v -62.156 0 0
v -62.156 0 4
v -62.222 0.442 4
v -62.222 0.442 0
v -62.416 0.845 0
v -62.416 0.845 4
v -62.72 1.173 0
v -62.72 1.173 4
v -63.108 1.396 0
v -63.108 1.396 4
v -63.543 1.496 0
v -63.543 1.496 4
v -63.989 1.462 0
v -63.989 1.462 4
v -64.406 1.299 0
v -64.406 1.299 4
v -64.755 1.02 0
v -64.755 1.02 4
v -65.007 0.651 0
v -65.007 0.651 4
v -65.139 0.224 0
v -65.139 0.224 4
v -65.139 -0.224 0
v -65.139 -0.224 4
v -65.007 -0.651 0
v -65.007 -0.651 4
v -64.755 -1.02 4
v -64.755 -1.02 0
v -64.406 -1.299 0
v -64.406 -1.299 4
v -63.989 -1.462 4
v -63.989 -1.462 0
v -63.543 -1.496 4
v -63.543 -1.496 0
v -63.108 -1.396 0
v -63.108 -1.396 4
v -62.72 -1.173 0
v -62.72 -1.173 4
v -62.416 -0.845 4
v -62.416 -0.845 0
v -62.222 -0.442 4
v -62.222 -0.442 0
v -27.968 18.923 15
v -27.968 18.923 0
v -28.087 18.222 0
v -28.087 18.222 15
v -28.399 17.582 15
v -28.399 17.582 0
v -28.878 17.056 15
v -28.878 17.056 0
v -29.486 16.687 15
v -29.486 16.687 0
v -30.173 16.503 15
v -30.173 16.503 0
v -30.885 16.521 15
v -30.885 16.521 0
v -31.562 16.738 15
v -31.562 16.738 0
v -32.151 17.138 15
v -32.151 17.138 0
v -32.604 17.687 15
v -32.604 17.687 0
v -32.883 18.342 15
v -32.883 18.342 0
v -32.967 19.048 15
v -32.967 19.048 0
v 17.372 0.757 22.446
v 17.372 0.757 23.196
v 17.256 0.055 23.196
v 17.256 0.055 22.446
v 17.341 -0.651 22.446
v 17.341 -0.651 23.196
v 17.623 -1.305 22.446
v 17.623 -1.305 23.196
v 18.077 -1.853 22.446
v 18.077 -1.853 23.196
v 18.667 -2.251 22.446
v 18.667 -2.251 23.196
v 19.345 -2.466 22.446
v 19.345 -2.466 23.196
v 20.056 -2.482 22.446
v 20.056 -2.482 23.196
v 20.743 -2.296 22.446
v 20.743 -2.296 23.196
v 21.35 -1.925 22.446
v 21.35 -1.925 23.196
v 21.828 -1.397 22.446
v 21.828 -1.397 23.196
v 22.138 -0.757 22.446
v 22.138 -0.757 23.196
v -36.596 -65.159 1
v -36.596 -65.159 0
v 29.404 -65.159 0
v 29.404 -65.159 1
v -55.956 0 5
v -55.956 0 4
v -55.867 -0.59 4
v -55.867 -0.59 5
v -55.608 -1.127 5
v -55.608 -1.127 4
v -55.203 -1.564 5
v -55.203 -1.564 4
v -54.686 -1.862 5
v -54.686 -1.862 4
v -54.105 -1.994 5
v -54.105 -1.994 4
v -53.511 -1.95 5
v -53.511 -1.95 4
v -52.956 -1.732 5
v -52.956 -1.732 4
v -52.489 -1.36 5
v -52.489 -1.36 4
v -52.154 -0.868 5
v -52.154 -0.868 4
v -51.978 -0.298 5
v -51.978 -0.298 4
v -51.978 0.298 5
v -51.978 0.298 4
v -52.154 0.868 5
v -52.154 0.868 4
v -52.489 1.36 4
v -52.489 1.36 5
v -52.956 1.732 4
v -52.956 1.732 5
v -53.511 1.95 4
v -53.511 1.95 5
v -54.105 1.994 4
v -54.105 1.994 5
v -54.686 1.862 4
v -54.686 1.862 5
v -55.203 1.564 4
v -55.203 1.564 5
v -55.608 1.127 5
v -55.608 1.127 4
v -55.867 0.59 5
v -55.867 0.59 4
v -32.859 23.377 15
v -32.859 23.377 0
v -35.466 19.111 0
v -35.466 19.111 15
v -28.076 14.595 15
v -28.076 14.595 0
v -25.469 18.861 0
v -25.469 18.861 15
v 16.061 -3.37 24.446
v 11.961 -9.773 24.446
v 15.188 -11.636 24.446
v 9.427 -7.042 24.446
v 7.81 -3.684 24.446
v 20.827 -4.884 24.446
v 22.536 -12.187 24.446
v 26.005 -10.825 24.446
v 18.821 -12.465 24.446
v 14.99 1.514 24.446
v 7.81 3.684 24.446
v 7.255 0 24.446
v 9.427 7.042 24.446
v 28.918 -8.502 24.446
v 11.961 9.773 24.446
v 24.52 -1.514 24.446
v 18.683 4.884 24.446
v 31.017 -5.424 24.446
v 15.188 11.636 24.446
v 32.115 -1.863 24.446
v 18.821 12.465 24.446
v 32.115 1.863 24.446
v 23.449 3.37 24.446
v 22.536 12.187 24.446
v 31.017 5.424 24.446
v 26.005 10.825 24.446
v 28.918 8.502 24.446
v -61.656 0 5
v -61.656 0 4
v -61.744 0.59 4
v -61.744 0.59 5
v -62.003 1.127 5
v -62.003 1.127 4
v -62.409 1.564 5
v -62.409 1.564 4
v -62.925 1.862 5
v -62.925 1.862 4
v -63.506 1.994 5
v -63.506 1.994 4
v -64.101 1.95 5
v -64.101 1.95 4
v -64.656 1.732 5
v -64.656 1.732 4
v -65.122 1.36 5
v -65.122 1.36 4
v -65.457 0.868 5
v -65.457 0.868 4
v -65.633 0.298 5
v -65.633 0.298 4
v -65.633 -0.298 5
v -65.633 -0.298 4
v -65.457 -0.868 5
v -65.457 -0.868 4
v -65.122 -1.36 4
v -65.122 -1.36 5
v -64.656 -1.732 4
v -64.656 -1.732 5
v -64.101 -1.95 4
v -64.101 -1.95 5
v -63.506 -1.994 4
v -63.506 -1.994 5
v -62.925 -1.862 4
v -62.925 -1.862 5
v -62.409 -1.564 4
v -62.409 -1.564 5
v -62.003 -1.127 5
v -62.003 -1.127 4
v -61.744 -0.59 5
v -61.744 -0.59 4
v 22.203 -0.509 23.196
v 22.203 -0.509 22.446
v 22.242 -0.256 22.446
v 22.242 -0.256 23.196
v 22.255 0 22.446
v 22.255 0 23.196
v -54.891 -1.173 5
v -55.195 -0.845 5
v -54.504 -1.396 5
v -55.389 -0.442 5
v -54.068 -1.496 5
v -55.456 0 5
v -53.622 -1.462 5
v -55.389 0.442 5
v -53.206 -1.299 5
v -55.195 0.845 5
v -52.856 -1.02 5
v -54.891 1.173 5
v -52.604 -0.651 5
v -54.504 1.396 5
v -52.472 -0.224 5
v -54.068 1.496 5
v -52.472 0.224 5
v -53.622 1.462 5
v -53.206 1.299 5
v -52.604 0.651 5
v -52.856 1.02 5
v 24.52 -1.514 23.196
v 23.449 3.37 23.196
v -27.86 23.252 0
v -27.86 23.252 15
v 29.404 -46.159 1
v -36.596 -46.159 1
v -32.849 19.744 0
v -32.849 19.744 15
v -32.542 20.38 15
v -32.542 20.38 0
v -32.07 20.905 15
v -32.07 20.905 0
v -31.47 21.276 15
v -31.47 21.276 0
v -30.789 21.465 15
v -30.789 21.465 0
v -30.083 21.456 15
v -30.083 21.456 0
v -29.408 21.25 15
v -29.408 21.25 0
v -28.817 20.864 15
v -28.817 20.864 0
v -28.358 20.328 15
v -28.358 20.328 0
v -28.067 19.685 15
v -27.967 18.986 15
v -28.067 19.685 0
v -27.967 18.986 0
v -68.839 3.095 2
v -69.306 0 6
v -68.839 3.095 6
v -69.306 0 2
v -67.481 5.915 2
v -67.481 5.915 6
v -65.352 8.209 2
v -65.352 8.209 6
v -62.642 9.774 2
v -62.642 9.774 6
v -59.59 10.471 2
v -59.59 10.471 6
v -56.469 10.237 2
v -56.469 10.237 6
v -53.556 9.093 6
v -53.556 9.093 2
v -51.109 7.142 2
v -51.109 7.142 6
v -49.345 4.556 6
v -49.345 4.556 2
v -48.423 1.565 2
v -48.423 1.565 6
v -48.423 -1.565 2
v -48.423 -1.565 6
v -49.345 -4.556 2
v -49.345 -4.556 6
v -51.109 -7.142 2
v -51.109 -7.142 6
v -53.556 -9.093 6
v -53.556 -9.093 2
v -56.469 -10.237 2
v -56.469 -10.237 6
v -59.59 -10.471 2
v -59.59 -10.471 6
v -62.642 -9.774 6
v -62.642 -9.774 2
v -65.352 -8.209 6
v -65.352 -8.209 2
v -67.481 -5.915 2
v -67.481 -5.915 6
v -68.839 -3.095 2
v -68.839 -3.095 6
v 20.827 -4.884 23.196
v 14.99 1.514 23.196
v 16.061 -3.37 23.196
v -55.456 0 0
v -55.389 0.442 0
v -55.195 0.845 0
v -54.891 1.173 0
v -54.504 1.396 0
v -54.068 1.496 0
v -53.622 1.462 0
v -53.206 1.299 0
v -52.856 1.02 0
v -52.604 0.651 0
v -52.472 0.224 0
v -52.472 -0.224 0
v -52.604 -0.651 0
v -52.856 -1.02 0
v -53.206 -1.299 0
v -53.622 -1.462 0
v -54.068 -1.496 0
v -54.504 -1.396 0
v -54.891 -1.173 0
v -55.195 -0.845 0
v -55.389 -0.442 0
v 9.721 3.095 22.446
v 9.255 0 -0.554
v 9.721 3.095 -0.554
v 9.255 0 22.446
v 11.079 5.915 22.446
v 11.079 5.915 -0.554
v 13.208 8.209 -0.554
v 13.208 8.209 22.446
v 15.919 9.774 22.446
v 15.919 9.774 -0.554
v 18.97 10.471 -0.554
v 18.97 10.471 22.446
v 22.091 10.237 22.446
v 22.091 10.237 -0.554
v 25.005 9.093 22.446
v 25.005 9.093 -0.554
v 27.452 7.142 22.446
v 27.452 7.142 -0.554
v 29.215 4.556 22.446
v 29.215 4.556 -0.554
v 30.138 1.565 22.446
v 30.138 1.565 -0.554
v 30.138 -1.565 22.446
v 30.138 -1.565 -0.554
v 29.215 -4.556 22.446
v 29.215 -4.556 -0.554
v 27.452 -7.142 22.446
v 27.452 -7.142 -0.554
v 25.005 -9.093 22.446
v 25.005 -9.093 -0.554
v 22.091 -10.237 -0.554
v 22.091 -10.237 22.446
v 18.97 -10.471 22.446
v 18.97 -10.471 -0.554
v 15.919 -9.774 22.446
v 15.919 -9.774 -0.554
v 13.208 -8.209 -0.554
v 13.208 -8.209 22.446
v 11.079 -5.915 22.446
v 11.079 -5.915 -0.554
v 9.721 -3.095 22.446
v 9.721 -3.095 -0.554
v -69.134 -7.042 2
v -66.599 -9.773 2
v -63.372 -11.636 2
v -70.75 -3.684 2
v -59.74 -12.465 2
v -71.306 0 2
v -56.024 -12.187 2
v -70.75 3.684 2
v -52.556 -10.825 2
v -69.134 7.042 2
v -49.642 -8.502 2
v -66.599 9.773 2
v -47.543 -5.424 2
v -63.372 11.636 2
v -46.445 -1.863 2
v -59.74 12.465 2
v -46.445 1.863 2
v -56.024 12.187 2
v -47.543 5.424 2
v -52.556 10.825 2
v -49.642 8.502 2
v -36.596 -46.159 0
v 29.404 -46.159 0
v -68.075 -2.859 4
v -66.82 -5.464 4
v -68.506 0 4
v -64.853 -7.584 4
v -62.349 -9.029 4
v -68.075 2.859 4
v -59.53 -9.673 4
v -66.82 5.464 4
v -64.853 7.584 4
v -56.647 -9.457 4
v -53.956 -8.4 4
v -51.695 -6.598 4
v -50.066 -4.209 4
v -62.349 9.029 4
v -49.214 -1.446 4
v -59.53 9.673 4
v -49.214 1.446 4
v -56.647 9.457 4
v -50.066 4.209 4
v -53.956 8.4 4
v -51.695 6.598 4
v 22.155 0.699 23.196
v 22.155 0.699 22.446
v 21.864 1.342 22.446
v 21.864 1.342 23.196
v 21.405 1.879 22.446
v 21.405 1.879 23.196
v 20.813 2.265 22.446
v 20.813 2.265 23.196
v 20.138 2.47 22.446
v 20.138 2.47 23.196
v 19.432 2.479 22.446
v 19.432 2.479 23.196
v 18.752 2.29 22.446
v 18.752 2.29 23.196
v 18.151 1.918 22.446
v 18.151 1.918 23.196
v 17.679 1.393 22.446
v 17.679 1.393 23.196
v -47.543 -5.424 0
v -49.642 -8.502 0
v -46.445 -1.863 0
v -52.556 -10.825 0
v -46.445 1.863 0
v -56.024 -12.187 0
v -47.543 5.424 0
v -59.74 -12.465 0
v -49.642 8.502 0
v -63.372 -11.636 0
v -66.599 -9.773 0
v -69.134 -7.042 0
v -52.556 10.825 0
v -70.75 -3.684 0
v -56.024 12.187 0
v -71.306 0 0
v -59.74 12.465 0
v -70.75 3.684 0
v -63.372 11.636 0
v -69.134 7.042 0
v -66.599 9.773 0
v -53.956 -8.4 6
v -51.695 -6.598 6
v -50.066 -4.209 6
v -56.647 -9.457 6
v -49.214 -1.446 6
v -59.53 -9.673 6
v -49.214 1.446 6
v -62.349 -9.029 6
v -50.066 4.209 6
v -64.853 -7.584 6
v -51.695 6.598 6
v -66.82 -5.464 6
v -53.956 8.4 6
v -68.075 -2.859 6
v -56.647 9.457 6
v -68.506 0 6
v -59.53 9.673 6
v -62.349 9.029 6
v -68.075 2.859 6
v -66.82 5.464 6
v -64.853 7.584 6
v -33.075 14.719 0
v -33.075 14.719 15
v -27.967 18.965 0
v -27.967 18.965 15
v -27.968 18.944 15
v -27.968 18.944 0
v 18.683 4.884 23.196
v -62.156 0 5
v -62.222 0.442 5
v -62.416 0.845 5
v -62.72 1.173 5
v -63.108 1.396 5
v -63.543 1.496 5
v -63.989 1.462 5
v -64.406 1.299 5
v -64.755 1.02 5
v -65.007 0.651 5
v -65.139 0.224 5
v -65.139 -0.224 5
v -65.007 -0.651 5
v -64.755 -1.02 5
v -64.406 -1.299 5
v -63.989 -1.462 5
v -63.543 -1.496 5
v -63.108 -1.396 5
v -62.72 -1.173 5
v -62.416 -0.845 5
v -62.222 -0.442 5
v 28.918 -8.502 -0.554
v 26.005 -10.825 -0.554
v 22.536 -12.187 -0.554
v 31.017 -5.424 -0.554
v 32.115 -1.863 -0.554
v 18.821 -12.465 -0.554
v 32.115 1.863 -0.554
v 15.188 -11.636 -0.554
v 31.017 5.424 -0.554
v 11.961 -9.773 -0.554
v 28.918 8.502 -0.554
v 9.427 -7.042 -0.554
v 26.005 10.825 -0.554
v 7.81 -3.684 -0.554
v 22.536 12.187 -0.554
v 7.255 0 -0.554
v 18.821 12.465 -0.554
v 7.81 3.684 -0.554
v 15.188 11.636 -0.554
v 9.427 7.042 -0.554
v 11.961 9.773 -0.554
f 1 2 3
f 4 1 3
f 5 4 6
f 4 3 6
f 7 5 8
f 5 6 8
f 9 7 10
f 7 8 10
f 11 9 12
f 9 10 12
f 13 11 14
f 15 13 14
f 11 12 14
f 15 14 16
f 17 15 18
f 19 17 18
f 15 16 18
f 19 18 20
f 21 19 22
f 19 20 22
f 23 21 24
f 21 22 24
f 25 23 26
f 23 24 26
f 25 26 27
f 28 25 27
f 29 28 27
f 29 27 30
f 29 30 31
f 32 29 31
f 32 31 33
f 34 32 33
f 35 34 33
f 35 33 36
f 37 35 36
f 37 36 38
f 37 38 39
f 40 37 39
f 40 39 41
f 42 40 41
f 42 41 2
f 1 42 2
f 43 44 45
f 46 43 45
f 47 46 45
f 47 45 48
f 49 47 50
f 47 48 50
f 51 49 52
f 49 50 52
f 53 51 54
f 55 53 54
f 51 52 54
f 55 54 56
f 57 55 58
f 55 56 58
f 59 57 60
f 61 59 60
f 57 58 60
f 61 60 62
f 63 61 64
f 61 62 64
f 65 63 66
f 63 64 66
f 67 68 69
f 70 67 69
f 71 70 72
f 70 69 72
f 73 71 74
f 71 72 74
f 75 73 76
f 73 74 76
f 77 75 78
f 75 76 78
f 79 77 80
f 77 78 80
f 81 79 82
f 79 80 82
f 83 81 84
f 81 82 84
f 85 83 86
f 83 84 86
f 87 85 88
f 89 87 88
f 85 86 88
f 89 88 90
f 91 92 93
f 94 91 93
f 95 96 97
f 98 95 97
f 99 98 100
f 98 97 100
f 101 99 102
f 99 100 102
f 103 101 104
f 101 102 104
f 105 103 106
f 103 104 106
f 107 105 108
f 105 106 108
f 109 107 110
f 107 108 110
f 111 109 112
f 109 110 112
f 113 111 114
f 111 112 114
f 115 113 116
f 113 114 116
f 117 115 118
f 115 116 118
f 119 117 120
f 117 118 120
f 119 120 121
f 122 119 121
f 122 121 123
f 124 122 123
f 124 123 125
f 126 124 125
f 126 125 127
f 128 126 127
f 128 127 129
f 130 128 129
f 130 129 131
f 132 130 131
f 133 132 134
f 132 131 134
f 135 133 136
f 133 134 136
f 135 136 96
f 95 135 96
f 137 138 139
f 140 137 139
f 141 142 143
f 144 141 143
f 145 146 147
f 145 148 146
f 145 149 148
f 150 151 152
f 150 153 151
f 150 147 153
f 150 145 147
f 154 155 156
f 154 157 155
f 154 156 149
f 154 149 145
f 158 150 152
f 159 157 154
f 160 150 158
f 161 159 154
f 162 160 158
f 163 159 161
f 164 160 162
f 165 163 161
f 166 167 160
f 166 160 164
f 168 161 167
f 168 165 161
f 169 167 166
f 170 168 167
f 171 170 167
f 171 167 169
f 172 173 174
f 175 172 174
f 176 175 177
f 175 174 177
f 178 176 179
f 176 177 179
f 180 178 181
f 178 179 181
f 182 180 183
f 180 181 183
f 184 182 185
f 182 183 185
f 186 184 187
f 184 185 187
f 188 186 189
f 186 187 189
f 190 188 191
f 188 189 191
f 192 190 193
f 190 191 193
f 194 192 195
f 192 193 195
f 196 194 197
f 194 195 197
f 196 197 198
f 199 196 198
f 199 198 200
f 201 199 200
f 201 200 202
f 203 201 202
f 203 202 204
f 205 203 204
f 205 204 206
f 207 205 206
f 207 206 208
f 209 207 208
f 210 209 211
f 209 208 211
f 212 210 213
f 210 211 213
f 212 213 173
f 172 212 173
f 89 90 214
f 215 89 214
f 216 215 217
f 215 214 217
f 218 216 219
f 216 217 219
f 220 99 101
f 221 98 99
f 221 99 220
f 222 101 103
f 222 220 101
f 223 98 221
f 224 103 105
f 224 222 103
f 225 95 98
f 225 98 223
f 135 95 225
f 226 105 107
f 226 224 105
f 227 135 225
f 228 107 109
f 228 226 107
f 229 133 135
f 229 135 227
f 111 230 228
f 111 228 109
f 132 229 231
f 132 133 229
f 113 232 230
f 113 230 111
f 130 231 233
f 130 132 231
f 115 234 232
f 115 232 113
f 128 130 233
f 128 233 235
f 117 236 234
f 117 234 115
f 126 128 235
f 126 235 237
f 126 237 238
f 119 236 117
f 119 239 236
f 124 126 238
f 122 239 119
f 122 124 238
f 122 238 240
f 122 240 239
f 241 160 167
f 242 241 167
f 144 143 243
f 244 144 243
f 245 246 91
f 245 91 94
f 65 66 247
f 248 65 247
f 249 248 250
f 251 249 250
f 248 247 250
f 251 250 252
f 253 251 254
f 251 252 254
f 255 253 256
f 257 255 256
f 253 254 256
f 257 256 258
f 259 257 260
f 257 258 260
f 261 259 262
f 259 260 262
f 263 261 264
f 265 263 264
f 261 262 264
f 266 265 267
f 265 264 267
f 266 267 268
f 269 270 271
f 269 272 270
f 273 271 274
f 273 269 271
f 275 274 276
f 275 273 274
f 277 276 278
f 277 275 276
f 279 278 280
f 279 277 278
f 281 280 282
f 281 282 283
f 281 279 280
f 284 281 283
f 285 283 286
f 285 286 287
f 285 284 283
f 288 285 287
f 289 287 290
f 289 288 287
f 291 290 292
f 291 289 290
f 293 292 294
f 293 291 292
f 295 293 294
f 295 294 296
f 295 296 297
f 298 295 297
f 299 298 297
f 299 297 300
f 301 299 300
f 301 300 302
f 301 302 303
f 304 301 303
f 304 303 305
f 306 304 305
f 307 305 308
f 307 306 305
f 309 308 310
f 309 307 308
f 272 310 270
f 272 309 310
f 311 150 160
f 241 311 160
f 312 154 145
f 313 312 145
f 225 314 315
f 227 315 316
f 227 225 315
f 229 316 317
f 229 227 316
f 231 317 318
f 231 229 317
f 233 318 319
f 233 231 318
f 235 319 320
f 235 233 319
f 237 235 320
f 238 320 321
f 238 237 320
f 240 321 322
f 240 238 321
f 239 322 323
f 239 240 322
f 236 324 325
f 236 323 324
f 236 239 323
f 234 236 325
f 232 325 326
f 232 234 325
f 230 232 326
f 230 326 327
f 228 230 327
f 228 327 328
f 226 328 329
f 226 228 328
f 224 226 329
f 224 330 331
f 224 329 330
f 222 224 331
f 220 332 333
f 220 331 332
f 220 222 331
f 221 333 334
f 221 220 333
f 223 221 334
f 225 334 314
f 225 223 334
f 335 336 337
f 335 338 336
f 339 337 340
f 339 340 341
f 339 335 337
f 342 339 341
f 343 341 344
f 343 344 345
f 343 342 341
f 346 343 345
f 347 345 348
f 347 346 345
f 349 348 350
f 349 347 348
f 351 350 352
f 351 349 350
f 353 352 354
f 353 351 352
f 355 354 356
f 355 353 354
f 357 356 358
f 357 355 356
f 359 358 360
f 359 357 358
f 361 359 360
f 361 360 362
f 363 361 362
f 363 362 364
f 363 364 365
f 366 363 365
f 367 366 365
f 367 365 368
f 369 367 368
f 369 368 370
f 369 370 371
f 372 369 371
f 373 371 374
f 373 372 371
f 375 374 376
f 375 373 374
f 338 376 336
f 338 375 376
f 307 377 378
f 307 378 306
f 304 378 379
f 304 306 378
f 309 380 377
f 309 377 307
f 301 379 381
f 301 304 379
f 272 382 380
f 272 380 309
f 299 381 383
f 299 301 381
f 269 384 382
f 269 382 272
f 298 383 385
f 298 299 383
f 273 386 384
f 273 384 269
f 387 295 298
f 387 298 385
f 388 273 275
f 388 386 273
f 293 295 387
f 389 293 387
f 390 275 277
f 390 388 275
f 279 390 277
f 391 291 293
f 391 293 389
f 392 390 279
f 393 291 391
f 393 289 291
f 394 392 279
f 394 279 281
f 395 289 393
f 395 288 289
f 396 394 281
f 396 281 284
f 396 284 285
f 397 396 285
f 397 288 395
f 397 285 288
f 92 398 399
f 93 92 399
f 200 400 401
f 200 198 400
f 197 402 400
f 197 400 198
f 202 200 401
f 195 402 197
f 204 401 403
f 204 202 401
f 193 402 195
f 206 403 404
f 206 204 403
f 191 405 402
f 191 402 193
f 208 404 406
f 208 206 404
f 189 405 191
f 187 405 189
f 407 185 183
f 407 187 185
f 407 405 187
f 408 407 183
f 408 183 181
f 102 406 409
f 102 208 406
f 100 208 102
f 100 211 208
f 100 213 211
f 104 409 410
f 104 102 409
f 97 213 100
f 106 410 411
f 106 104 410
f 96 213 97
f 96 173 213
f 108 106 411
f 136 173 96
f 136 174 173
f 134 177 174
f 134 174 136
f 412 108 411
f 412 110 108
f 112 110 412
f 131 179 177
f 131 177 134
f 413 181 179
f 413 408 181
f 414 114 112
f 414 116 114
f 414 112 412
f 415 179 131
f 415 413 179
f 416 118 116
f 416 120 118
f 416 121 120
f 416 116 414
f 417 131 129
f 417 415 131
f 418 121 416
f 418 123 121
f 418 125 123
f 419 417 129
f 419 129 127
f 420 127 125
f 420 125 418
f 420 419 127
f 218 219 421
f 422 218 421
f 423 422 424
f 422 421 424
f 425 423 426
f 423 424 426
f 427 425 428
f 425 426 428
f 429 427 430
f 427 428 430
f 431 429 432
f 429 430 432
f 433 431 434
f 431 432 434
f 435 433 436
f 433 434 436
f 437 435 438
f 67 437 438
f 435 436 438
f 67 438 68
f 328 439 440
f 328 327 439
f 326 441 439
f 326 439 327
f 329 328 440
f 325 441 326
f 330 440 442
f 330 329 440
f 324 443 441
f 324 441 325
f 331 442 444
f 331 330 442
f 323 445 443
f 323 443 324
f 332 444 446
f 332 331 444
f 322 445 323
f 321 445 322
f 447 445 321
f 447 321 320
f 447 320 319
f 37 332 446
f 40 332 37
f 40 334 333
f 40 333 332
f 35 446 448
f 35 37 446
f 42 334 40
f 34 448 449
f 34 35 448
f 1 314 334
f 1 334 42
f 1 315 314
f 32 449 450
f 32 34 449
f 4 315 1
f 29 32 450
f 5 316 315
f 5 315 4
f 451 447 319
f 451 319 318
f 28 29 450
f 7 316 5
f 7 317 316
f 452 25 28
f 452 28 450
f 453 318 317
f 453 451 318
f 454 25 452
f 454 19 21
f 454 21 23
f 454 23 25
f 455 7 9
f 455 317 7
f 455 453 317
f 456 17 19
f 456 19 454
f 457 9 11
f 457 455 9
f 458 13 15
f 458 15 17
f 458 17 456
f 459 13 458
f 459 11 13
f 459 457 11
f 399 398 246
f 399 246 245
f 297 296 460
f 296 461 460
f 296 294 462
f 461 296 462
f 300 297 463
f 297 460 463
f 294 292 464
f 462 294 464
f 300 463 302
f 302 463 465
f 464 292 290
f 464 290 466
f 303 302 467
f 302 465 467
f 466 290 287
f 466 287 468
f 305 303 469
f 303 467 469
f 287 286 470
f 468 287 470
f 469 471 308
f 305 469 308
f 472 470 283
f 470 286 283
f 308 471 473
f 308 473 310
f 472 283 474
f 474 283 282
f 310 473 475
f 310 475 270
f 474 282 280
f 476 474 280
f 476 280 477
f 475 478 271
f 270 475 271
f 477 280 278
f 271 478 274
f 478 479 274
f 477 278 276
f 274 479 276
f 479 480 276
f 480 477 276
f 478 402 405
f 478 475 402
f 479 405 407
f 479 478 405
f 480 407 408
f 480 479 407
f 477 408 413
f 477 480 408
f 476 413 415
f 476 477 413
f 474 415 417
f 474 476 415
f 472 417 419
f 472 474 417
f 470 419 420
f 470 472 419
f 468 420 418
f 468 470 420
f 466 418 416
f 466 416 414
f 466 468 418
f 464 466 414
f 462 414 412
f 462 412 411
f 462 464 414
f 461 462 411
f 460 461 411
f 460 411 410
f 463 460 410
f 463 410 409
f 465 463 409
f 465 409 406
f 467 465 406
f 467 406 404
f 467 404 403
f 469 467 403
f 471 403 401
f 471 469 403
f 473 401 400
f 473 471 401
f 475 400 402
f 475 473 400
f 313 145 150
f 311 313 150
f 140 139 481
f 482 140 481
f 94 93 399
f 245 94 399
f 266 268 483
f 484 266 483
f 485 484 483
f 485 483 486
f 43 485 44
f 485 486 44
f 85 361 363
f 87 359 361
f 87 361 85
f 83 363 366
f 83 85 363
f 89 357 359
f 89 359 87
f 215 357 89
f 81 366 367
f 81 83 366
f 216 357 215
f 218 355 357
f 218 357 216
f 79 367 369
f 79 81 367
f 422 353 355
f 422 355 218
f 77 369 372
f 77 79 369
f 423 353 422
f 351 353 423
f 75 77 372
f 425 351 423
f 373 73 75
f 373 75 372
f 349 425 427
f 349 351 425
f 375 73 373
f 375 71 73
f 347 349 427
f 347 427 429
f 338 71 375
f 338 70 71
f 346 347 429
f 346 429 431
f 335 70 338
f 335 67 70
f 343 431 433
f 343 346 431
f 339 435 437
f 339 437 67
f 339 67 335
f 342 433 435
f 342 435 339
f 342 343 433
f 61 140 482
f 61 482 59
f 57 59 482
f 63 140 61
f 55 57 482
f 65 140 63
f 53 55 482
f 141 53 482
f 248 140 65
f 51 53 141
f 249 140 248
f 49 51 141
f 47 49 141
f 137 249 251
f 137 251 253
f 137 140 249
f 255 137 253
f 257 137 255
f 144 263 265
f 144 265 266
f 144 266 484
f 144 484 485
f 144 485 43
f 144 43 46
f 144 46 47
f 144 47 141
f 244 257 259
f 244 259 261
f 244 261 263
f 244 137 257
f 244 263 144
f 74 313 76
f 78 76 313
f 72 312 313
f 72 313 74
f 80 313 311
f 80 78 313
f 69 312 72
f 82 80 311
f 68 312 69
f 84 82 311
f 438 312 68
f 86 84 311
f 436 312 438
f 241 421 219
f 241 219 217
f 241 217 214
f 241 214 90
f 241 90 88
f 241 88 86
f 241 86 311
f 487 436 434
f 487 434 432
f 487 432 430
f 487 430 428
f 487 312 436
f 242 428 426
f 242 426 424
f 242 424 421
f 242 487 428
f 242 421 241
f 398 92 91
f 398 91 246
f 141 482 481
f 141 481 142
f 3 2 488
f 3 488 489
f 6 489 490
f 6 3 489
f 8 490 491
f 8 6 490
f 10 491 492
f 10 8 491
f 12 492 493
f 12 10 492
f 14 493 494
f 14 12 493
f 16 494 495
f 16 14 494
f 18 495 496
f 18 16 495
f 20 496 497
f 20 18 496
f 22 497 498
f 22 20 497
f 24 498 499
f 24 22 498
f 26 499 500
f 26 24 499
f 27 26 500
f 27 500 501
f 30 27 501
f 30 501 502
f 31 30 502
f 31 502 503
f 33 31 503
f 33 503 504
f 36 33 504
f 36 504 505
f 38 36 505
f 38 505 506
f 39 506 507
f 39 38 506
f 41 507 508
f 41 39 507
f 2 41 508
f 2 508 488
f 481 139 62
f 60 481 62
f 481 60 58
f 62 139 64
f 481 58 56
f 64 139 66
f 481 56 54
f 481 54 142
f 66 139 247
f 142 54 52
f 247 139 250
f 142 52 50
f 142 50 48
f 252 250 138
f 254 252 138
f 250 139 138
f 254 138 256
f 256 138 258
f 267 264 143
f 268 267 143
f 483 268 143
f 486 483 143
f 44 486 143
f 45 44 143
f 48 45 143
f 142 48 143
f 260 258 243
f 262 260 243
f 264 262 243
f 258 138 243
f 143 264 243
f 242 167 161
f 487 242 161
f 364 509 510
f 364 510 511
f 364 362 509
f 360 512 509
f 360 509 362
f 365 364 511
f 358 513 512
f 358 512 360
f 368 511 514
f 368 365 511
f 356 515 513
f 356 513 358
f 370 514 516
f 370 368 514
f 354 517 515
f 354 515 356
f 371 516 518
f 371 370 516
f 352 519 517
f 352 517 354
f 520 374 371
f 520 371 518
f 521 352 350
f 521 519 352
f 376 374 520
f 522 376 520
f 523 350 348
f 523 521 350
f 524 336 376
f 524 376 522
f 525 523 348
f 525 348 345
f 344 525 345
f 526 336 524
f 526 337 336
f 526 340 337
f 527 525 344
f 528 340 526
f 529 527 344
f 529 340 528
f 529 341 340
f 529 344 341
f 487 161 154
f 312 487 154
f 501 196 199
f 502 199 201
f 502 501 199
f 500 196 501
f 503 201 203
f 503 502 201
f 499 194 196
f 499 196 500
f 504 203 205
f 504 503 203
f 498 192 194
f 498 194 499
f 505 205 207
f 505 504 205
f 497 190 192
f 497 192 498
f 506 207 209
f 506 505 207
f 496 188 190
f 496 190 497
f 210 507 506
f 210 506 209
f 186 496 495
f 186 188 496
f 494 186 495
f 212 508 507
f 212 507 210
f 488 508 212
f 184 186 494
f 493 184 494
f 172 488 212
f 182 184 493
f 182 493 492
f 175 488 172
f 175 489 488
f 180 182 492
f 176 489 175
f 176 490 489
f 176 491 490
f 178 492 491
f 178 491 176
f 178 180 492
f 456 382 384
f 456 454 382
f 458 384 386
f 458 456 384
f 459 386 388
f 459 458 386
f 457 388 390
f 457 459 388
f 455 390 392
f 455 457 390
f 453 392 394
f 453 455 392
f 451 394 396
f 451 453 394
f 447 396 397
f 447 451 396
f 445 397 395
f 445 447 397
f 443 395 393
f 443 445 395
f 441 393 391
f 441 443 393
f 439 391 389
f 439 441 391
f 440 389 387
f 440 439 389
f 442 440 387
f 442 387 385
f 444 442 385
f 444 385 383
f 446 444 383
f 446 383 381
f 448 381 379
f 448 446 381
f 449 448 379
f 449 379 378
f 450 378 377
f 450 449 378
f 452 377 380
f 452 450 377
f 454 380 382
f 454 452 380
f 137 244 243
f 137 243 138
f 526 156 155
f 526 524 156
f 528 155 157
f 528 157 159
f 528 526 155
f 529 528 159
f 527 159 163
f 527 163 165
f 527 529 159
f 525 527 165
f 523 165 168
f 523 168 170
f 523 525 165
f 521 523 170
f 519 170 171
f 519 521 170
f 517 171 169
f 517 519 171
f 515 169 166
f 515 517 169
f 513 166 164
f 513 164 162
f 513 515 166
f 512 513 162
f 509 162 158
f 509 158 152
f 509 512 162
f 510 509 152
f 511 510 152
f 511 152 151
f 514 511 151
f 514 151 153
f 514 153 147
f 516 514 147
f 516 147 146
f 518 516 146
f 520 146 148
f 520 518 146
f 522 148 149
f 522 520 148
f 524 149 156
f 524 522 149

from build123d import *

# Parameters (mm, degrees)
F1_DEPTH  = 15
F5_DEPTH  = 25
F6_DEPTH  = 1.25
F7_W      = 0.8
F7_H      = 2
F9_R      = 2
F9_R_2    = 1.5
F10_DEPTH = 1
F11_DEPTH = 25
F12_W     = 66
F12_H     = 19
F13_DEPTH = 1


with BuildPart() as f1:
    # F0 (on Top) → F1 (new body)
    with BuildSketch(Plane.XY):
        with BuildLine():
            Line((-27.9680936464, 18.9234757941), (-25.4688717607, 18.8611062027))
            Line((-25.4688717607, 18.8611062027), (-27.8600663452, 23.2522550796))
            Line((-27.8600663452, 23.2522550796), (-32.8585101166, 23.3769942625))
            Line((-32.8585101166, 23.3769942625), (-35.4657593036, 19.1105845686))
            Line((-35.4657593036, 19.1105845686), (-32.9665374179, 19.0482149771))
            ThreePointArc((-32.9665374179, 19.0482149771), (-30.4361283096, 21.4856508495), (-27.9673155322, 18.9858453856))
            ThreePointArc((-27.9673155322, 18.9858453856), (-27.9675100683, 18.9546581631), (-27.9680936464, 18.9234757941))
        make_face()
        with BuildLine():
            Line((-28.0761209477, 14.5946965087), (-25.4688717607, 18.8611062027))
            Line((-25.4688717607, 18.8611062027), (-27.9680936464, 18.9234757941))
            ThreePointArc((-27.9680936464, 18.9234757941), (-30.5296851236, 16.4866234999), (-32.9665374179, 19.0482149771))
            Line((-32.9665374179, 19.0482149771), (-35.4657593036, 19.1105845686))
            Line((-35.4657593036, 19.1105845686), (-33.0745647191, 14.7194356916))
            Line((-33.0745647191, 14.7194356916), (-28.0761209477, 14.5946965087))
        make_face()
    extrude(amount=F1_DEPTH)


with BuildPart() as f3:
    # F2 (on Front) → F3 (revolve)
    with BuildSketch(Plane.XZ):
        Polygon((7.2549805045, 24.4458311237), (7.2549805045, -0.5541688763), (9.2549805045, -0.5541688763), (9.2549805045, 22.4458311237), (19.7549805045, 22.4458311237), (19.7549805045, 24.4458311237), align=None)
    revolve(axis=Axis((19.7549805045, 0, 23.4458311237), (0, 0, -1)))

    # F4 (on face) → F5 (cut)
    with BuildSketch(Plane.XY.offset(24.4458311237)):
        with BuildLine():
            Line((22.1376669218, -0.7568391089), (17.3722940872, 0.7568391089))
            ThreePointArc((17.3722940872, 0.7568391089), (18.9981413957, -2.3826864173), (22.1376669218, -0.7568391089))
        make_face()
        with BuildLine():
            ThreePointArc((22.2549805045, 0), (20.1379191136, 2.4704975251), (17.3722940872, 0.7568391089))
            Line((17.3722940872, 0.7568391089), (22.1376669218, -0.7568391089))
            ThreePointArc((22.1376669218, -0.7568391089), (22.2254780296, -0.3829386091), (22.2549805045, 0))
        make_face()
    extrude(amount=-F5_DEPTH, mode=Mode.SUBTRACT)

    # F4 (on face) → F6 (cut)
    with BuildSketch(Plane.XY.offset(24.4458311237)):
        with BuildLine():
            Line((23.4485507115, 3.3700948244), (18.6831778769, 4.8837730422))
            Line((18.6831778769, 4.8837730422), (14.9896076699, 1.5136782177))
            Line((14.9896076699, 1.5136782177), (17.3722940872, 0.7568391089))
            ThreePointArc((17.3722940872, 0.7568391089), (20.1379191136, 2.4704975251), (22.2549805045, 0))
            ThreePointArc((22.2549805045, 0), (22.2254780296, -0.3829386091), (22.1376669218, -0.7568391089))
            Line((22.1376669218, -0.7568391089), (24.5203533392, -1.5136782177))
            Line((24.5203533392, -1.5136782177), (23.4485507115, 3.3700948244))
        make_face()
        with BuildLine():
            Line((17.3722940872, 0.7568391089), (14.9896076699, 1.5136782177))
            Line((14.9896076699, 1.5136782177), (16.0614102975, -3.3700948244))
            Line((16.0614102975, -3.3700948244), (20.8267831321, -4.8837730422))
            Line((20.8267831321, -4.8837730422), (24.5203533392, -1.5136782177))
            Line((24.5203533392, -1.5136782177), (22.1376669218, -0.7568391089))
            ThreePointArc((22.1376669218, -0.7568391089), (18.9981413957, -2.3826864173), (17.3722940872, 0.7568391089))
        make_face()
    extrude(amount=-F6_DEPTH, mode=Mode.SUBTRACT)


with BuildPart() as f8:
    # F7 (on Front) → F8 (revolve)
    with BuildSketch(Plane.XZ):
        Polygon((-71.3055579922, 2), (-71.3055579922, 0), (-58.8055579922, 0), (-58.8055579922, 4), (-68.5055579922, 4), (-69.3055579922, 4), (-69.3055579922, 2), align=None)
        with Locations((-68.9055579922, 5)):
            Rectangle(F7_W, F7_H)
    revolve(axis=Axis((-58.8055579922, 0, 2), (0, 0, -1)))

    # F9 (on face) → F10 (join)
    with BuildSketch(Plane.XY.offset(4)):
        with Locations((-63.6555579922, 0)):
            Circle(F9_R)
        with Locations((-63.6555579922, 0)):
            Circle(F9_R_2, mode=Mode.SUBTRACT)
        with BuildLine():
            ThreePointArc((-51.9555579922, 0), (-53.9555579922, 2), (-55.9555579922, 0))
            ThreePointArc((-55.9555579922, 0), (-53.9555579922, -2), (-51.9555579922, 0))
        make_face()
        with BuildLine():
            ThreePointArc((-52.4555579922, 0), (-53.9555579922, -1.5), (-55.4555579922, 0))
            ThreePointArc((-55.4555579922, 0), (-53.9555579922, 1.5), (-52.4555579922, 0))
        make_face(mode=Mode.SUBTRACT)
    extrude(amount=F10_DEPTH)

    # F11 (cut): faces of the model
    f11_faces = [f8.faces().sort_by_distance(p)[0] for p in [
        (-53.9555579922, 0, 4),
        (-63.6555579922, 0, 4),
    ]]
    extrude(f11_faces, amount=-F11_DEPTH, mode=Mode.SUBTRACT)


with BuildPart() as f13:
    # F12 (on Top) → F13 (new body)
    with BuildSketch(Plane.XY):
        with Locations((-3.5955148538, -55.6588086109)):
            Rectangle(F12_W, F12_H)
    extrude(amount=F13_DEPTH)


solid = Compound([f1.part, f3.part, f8.part, f13.part])
